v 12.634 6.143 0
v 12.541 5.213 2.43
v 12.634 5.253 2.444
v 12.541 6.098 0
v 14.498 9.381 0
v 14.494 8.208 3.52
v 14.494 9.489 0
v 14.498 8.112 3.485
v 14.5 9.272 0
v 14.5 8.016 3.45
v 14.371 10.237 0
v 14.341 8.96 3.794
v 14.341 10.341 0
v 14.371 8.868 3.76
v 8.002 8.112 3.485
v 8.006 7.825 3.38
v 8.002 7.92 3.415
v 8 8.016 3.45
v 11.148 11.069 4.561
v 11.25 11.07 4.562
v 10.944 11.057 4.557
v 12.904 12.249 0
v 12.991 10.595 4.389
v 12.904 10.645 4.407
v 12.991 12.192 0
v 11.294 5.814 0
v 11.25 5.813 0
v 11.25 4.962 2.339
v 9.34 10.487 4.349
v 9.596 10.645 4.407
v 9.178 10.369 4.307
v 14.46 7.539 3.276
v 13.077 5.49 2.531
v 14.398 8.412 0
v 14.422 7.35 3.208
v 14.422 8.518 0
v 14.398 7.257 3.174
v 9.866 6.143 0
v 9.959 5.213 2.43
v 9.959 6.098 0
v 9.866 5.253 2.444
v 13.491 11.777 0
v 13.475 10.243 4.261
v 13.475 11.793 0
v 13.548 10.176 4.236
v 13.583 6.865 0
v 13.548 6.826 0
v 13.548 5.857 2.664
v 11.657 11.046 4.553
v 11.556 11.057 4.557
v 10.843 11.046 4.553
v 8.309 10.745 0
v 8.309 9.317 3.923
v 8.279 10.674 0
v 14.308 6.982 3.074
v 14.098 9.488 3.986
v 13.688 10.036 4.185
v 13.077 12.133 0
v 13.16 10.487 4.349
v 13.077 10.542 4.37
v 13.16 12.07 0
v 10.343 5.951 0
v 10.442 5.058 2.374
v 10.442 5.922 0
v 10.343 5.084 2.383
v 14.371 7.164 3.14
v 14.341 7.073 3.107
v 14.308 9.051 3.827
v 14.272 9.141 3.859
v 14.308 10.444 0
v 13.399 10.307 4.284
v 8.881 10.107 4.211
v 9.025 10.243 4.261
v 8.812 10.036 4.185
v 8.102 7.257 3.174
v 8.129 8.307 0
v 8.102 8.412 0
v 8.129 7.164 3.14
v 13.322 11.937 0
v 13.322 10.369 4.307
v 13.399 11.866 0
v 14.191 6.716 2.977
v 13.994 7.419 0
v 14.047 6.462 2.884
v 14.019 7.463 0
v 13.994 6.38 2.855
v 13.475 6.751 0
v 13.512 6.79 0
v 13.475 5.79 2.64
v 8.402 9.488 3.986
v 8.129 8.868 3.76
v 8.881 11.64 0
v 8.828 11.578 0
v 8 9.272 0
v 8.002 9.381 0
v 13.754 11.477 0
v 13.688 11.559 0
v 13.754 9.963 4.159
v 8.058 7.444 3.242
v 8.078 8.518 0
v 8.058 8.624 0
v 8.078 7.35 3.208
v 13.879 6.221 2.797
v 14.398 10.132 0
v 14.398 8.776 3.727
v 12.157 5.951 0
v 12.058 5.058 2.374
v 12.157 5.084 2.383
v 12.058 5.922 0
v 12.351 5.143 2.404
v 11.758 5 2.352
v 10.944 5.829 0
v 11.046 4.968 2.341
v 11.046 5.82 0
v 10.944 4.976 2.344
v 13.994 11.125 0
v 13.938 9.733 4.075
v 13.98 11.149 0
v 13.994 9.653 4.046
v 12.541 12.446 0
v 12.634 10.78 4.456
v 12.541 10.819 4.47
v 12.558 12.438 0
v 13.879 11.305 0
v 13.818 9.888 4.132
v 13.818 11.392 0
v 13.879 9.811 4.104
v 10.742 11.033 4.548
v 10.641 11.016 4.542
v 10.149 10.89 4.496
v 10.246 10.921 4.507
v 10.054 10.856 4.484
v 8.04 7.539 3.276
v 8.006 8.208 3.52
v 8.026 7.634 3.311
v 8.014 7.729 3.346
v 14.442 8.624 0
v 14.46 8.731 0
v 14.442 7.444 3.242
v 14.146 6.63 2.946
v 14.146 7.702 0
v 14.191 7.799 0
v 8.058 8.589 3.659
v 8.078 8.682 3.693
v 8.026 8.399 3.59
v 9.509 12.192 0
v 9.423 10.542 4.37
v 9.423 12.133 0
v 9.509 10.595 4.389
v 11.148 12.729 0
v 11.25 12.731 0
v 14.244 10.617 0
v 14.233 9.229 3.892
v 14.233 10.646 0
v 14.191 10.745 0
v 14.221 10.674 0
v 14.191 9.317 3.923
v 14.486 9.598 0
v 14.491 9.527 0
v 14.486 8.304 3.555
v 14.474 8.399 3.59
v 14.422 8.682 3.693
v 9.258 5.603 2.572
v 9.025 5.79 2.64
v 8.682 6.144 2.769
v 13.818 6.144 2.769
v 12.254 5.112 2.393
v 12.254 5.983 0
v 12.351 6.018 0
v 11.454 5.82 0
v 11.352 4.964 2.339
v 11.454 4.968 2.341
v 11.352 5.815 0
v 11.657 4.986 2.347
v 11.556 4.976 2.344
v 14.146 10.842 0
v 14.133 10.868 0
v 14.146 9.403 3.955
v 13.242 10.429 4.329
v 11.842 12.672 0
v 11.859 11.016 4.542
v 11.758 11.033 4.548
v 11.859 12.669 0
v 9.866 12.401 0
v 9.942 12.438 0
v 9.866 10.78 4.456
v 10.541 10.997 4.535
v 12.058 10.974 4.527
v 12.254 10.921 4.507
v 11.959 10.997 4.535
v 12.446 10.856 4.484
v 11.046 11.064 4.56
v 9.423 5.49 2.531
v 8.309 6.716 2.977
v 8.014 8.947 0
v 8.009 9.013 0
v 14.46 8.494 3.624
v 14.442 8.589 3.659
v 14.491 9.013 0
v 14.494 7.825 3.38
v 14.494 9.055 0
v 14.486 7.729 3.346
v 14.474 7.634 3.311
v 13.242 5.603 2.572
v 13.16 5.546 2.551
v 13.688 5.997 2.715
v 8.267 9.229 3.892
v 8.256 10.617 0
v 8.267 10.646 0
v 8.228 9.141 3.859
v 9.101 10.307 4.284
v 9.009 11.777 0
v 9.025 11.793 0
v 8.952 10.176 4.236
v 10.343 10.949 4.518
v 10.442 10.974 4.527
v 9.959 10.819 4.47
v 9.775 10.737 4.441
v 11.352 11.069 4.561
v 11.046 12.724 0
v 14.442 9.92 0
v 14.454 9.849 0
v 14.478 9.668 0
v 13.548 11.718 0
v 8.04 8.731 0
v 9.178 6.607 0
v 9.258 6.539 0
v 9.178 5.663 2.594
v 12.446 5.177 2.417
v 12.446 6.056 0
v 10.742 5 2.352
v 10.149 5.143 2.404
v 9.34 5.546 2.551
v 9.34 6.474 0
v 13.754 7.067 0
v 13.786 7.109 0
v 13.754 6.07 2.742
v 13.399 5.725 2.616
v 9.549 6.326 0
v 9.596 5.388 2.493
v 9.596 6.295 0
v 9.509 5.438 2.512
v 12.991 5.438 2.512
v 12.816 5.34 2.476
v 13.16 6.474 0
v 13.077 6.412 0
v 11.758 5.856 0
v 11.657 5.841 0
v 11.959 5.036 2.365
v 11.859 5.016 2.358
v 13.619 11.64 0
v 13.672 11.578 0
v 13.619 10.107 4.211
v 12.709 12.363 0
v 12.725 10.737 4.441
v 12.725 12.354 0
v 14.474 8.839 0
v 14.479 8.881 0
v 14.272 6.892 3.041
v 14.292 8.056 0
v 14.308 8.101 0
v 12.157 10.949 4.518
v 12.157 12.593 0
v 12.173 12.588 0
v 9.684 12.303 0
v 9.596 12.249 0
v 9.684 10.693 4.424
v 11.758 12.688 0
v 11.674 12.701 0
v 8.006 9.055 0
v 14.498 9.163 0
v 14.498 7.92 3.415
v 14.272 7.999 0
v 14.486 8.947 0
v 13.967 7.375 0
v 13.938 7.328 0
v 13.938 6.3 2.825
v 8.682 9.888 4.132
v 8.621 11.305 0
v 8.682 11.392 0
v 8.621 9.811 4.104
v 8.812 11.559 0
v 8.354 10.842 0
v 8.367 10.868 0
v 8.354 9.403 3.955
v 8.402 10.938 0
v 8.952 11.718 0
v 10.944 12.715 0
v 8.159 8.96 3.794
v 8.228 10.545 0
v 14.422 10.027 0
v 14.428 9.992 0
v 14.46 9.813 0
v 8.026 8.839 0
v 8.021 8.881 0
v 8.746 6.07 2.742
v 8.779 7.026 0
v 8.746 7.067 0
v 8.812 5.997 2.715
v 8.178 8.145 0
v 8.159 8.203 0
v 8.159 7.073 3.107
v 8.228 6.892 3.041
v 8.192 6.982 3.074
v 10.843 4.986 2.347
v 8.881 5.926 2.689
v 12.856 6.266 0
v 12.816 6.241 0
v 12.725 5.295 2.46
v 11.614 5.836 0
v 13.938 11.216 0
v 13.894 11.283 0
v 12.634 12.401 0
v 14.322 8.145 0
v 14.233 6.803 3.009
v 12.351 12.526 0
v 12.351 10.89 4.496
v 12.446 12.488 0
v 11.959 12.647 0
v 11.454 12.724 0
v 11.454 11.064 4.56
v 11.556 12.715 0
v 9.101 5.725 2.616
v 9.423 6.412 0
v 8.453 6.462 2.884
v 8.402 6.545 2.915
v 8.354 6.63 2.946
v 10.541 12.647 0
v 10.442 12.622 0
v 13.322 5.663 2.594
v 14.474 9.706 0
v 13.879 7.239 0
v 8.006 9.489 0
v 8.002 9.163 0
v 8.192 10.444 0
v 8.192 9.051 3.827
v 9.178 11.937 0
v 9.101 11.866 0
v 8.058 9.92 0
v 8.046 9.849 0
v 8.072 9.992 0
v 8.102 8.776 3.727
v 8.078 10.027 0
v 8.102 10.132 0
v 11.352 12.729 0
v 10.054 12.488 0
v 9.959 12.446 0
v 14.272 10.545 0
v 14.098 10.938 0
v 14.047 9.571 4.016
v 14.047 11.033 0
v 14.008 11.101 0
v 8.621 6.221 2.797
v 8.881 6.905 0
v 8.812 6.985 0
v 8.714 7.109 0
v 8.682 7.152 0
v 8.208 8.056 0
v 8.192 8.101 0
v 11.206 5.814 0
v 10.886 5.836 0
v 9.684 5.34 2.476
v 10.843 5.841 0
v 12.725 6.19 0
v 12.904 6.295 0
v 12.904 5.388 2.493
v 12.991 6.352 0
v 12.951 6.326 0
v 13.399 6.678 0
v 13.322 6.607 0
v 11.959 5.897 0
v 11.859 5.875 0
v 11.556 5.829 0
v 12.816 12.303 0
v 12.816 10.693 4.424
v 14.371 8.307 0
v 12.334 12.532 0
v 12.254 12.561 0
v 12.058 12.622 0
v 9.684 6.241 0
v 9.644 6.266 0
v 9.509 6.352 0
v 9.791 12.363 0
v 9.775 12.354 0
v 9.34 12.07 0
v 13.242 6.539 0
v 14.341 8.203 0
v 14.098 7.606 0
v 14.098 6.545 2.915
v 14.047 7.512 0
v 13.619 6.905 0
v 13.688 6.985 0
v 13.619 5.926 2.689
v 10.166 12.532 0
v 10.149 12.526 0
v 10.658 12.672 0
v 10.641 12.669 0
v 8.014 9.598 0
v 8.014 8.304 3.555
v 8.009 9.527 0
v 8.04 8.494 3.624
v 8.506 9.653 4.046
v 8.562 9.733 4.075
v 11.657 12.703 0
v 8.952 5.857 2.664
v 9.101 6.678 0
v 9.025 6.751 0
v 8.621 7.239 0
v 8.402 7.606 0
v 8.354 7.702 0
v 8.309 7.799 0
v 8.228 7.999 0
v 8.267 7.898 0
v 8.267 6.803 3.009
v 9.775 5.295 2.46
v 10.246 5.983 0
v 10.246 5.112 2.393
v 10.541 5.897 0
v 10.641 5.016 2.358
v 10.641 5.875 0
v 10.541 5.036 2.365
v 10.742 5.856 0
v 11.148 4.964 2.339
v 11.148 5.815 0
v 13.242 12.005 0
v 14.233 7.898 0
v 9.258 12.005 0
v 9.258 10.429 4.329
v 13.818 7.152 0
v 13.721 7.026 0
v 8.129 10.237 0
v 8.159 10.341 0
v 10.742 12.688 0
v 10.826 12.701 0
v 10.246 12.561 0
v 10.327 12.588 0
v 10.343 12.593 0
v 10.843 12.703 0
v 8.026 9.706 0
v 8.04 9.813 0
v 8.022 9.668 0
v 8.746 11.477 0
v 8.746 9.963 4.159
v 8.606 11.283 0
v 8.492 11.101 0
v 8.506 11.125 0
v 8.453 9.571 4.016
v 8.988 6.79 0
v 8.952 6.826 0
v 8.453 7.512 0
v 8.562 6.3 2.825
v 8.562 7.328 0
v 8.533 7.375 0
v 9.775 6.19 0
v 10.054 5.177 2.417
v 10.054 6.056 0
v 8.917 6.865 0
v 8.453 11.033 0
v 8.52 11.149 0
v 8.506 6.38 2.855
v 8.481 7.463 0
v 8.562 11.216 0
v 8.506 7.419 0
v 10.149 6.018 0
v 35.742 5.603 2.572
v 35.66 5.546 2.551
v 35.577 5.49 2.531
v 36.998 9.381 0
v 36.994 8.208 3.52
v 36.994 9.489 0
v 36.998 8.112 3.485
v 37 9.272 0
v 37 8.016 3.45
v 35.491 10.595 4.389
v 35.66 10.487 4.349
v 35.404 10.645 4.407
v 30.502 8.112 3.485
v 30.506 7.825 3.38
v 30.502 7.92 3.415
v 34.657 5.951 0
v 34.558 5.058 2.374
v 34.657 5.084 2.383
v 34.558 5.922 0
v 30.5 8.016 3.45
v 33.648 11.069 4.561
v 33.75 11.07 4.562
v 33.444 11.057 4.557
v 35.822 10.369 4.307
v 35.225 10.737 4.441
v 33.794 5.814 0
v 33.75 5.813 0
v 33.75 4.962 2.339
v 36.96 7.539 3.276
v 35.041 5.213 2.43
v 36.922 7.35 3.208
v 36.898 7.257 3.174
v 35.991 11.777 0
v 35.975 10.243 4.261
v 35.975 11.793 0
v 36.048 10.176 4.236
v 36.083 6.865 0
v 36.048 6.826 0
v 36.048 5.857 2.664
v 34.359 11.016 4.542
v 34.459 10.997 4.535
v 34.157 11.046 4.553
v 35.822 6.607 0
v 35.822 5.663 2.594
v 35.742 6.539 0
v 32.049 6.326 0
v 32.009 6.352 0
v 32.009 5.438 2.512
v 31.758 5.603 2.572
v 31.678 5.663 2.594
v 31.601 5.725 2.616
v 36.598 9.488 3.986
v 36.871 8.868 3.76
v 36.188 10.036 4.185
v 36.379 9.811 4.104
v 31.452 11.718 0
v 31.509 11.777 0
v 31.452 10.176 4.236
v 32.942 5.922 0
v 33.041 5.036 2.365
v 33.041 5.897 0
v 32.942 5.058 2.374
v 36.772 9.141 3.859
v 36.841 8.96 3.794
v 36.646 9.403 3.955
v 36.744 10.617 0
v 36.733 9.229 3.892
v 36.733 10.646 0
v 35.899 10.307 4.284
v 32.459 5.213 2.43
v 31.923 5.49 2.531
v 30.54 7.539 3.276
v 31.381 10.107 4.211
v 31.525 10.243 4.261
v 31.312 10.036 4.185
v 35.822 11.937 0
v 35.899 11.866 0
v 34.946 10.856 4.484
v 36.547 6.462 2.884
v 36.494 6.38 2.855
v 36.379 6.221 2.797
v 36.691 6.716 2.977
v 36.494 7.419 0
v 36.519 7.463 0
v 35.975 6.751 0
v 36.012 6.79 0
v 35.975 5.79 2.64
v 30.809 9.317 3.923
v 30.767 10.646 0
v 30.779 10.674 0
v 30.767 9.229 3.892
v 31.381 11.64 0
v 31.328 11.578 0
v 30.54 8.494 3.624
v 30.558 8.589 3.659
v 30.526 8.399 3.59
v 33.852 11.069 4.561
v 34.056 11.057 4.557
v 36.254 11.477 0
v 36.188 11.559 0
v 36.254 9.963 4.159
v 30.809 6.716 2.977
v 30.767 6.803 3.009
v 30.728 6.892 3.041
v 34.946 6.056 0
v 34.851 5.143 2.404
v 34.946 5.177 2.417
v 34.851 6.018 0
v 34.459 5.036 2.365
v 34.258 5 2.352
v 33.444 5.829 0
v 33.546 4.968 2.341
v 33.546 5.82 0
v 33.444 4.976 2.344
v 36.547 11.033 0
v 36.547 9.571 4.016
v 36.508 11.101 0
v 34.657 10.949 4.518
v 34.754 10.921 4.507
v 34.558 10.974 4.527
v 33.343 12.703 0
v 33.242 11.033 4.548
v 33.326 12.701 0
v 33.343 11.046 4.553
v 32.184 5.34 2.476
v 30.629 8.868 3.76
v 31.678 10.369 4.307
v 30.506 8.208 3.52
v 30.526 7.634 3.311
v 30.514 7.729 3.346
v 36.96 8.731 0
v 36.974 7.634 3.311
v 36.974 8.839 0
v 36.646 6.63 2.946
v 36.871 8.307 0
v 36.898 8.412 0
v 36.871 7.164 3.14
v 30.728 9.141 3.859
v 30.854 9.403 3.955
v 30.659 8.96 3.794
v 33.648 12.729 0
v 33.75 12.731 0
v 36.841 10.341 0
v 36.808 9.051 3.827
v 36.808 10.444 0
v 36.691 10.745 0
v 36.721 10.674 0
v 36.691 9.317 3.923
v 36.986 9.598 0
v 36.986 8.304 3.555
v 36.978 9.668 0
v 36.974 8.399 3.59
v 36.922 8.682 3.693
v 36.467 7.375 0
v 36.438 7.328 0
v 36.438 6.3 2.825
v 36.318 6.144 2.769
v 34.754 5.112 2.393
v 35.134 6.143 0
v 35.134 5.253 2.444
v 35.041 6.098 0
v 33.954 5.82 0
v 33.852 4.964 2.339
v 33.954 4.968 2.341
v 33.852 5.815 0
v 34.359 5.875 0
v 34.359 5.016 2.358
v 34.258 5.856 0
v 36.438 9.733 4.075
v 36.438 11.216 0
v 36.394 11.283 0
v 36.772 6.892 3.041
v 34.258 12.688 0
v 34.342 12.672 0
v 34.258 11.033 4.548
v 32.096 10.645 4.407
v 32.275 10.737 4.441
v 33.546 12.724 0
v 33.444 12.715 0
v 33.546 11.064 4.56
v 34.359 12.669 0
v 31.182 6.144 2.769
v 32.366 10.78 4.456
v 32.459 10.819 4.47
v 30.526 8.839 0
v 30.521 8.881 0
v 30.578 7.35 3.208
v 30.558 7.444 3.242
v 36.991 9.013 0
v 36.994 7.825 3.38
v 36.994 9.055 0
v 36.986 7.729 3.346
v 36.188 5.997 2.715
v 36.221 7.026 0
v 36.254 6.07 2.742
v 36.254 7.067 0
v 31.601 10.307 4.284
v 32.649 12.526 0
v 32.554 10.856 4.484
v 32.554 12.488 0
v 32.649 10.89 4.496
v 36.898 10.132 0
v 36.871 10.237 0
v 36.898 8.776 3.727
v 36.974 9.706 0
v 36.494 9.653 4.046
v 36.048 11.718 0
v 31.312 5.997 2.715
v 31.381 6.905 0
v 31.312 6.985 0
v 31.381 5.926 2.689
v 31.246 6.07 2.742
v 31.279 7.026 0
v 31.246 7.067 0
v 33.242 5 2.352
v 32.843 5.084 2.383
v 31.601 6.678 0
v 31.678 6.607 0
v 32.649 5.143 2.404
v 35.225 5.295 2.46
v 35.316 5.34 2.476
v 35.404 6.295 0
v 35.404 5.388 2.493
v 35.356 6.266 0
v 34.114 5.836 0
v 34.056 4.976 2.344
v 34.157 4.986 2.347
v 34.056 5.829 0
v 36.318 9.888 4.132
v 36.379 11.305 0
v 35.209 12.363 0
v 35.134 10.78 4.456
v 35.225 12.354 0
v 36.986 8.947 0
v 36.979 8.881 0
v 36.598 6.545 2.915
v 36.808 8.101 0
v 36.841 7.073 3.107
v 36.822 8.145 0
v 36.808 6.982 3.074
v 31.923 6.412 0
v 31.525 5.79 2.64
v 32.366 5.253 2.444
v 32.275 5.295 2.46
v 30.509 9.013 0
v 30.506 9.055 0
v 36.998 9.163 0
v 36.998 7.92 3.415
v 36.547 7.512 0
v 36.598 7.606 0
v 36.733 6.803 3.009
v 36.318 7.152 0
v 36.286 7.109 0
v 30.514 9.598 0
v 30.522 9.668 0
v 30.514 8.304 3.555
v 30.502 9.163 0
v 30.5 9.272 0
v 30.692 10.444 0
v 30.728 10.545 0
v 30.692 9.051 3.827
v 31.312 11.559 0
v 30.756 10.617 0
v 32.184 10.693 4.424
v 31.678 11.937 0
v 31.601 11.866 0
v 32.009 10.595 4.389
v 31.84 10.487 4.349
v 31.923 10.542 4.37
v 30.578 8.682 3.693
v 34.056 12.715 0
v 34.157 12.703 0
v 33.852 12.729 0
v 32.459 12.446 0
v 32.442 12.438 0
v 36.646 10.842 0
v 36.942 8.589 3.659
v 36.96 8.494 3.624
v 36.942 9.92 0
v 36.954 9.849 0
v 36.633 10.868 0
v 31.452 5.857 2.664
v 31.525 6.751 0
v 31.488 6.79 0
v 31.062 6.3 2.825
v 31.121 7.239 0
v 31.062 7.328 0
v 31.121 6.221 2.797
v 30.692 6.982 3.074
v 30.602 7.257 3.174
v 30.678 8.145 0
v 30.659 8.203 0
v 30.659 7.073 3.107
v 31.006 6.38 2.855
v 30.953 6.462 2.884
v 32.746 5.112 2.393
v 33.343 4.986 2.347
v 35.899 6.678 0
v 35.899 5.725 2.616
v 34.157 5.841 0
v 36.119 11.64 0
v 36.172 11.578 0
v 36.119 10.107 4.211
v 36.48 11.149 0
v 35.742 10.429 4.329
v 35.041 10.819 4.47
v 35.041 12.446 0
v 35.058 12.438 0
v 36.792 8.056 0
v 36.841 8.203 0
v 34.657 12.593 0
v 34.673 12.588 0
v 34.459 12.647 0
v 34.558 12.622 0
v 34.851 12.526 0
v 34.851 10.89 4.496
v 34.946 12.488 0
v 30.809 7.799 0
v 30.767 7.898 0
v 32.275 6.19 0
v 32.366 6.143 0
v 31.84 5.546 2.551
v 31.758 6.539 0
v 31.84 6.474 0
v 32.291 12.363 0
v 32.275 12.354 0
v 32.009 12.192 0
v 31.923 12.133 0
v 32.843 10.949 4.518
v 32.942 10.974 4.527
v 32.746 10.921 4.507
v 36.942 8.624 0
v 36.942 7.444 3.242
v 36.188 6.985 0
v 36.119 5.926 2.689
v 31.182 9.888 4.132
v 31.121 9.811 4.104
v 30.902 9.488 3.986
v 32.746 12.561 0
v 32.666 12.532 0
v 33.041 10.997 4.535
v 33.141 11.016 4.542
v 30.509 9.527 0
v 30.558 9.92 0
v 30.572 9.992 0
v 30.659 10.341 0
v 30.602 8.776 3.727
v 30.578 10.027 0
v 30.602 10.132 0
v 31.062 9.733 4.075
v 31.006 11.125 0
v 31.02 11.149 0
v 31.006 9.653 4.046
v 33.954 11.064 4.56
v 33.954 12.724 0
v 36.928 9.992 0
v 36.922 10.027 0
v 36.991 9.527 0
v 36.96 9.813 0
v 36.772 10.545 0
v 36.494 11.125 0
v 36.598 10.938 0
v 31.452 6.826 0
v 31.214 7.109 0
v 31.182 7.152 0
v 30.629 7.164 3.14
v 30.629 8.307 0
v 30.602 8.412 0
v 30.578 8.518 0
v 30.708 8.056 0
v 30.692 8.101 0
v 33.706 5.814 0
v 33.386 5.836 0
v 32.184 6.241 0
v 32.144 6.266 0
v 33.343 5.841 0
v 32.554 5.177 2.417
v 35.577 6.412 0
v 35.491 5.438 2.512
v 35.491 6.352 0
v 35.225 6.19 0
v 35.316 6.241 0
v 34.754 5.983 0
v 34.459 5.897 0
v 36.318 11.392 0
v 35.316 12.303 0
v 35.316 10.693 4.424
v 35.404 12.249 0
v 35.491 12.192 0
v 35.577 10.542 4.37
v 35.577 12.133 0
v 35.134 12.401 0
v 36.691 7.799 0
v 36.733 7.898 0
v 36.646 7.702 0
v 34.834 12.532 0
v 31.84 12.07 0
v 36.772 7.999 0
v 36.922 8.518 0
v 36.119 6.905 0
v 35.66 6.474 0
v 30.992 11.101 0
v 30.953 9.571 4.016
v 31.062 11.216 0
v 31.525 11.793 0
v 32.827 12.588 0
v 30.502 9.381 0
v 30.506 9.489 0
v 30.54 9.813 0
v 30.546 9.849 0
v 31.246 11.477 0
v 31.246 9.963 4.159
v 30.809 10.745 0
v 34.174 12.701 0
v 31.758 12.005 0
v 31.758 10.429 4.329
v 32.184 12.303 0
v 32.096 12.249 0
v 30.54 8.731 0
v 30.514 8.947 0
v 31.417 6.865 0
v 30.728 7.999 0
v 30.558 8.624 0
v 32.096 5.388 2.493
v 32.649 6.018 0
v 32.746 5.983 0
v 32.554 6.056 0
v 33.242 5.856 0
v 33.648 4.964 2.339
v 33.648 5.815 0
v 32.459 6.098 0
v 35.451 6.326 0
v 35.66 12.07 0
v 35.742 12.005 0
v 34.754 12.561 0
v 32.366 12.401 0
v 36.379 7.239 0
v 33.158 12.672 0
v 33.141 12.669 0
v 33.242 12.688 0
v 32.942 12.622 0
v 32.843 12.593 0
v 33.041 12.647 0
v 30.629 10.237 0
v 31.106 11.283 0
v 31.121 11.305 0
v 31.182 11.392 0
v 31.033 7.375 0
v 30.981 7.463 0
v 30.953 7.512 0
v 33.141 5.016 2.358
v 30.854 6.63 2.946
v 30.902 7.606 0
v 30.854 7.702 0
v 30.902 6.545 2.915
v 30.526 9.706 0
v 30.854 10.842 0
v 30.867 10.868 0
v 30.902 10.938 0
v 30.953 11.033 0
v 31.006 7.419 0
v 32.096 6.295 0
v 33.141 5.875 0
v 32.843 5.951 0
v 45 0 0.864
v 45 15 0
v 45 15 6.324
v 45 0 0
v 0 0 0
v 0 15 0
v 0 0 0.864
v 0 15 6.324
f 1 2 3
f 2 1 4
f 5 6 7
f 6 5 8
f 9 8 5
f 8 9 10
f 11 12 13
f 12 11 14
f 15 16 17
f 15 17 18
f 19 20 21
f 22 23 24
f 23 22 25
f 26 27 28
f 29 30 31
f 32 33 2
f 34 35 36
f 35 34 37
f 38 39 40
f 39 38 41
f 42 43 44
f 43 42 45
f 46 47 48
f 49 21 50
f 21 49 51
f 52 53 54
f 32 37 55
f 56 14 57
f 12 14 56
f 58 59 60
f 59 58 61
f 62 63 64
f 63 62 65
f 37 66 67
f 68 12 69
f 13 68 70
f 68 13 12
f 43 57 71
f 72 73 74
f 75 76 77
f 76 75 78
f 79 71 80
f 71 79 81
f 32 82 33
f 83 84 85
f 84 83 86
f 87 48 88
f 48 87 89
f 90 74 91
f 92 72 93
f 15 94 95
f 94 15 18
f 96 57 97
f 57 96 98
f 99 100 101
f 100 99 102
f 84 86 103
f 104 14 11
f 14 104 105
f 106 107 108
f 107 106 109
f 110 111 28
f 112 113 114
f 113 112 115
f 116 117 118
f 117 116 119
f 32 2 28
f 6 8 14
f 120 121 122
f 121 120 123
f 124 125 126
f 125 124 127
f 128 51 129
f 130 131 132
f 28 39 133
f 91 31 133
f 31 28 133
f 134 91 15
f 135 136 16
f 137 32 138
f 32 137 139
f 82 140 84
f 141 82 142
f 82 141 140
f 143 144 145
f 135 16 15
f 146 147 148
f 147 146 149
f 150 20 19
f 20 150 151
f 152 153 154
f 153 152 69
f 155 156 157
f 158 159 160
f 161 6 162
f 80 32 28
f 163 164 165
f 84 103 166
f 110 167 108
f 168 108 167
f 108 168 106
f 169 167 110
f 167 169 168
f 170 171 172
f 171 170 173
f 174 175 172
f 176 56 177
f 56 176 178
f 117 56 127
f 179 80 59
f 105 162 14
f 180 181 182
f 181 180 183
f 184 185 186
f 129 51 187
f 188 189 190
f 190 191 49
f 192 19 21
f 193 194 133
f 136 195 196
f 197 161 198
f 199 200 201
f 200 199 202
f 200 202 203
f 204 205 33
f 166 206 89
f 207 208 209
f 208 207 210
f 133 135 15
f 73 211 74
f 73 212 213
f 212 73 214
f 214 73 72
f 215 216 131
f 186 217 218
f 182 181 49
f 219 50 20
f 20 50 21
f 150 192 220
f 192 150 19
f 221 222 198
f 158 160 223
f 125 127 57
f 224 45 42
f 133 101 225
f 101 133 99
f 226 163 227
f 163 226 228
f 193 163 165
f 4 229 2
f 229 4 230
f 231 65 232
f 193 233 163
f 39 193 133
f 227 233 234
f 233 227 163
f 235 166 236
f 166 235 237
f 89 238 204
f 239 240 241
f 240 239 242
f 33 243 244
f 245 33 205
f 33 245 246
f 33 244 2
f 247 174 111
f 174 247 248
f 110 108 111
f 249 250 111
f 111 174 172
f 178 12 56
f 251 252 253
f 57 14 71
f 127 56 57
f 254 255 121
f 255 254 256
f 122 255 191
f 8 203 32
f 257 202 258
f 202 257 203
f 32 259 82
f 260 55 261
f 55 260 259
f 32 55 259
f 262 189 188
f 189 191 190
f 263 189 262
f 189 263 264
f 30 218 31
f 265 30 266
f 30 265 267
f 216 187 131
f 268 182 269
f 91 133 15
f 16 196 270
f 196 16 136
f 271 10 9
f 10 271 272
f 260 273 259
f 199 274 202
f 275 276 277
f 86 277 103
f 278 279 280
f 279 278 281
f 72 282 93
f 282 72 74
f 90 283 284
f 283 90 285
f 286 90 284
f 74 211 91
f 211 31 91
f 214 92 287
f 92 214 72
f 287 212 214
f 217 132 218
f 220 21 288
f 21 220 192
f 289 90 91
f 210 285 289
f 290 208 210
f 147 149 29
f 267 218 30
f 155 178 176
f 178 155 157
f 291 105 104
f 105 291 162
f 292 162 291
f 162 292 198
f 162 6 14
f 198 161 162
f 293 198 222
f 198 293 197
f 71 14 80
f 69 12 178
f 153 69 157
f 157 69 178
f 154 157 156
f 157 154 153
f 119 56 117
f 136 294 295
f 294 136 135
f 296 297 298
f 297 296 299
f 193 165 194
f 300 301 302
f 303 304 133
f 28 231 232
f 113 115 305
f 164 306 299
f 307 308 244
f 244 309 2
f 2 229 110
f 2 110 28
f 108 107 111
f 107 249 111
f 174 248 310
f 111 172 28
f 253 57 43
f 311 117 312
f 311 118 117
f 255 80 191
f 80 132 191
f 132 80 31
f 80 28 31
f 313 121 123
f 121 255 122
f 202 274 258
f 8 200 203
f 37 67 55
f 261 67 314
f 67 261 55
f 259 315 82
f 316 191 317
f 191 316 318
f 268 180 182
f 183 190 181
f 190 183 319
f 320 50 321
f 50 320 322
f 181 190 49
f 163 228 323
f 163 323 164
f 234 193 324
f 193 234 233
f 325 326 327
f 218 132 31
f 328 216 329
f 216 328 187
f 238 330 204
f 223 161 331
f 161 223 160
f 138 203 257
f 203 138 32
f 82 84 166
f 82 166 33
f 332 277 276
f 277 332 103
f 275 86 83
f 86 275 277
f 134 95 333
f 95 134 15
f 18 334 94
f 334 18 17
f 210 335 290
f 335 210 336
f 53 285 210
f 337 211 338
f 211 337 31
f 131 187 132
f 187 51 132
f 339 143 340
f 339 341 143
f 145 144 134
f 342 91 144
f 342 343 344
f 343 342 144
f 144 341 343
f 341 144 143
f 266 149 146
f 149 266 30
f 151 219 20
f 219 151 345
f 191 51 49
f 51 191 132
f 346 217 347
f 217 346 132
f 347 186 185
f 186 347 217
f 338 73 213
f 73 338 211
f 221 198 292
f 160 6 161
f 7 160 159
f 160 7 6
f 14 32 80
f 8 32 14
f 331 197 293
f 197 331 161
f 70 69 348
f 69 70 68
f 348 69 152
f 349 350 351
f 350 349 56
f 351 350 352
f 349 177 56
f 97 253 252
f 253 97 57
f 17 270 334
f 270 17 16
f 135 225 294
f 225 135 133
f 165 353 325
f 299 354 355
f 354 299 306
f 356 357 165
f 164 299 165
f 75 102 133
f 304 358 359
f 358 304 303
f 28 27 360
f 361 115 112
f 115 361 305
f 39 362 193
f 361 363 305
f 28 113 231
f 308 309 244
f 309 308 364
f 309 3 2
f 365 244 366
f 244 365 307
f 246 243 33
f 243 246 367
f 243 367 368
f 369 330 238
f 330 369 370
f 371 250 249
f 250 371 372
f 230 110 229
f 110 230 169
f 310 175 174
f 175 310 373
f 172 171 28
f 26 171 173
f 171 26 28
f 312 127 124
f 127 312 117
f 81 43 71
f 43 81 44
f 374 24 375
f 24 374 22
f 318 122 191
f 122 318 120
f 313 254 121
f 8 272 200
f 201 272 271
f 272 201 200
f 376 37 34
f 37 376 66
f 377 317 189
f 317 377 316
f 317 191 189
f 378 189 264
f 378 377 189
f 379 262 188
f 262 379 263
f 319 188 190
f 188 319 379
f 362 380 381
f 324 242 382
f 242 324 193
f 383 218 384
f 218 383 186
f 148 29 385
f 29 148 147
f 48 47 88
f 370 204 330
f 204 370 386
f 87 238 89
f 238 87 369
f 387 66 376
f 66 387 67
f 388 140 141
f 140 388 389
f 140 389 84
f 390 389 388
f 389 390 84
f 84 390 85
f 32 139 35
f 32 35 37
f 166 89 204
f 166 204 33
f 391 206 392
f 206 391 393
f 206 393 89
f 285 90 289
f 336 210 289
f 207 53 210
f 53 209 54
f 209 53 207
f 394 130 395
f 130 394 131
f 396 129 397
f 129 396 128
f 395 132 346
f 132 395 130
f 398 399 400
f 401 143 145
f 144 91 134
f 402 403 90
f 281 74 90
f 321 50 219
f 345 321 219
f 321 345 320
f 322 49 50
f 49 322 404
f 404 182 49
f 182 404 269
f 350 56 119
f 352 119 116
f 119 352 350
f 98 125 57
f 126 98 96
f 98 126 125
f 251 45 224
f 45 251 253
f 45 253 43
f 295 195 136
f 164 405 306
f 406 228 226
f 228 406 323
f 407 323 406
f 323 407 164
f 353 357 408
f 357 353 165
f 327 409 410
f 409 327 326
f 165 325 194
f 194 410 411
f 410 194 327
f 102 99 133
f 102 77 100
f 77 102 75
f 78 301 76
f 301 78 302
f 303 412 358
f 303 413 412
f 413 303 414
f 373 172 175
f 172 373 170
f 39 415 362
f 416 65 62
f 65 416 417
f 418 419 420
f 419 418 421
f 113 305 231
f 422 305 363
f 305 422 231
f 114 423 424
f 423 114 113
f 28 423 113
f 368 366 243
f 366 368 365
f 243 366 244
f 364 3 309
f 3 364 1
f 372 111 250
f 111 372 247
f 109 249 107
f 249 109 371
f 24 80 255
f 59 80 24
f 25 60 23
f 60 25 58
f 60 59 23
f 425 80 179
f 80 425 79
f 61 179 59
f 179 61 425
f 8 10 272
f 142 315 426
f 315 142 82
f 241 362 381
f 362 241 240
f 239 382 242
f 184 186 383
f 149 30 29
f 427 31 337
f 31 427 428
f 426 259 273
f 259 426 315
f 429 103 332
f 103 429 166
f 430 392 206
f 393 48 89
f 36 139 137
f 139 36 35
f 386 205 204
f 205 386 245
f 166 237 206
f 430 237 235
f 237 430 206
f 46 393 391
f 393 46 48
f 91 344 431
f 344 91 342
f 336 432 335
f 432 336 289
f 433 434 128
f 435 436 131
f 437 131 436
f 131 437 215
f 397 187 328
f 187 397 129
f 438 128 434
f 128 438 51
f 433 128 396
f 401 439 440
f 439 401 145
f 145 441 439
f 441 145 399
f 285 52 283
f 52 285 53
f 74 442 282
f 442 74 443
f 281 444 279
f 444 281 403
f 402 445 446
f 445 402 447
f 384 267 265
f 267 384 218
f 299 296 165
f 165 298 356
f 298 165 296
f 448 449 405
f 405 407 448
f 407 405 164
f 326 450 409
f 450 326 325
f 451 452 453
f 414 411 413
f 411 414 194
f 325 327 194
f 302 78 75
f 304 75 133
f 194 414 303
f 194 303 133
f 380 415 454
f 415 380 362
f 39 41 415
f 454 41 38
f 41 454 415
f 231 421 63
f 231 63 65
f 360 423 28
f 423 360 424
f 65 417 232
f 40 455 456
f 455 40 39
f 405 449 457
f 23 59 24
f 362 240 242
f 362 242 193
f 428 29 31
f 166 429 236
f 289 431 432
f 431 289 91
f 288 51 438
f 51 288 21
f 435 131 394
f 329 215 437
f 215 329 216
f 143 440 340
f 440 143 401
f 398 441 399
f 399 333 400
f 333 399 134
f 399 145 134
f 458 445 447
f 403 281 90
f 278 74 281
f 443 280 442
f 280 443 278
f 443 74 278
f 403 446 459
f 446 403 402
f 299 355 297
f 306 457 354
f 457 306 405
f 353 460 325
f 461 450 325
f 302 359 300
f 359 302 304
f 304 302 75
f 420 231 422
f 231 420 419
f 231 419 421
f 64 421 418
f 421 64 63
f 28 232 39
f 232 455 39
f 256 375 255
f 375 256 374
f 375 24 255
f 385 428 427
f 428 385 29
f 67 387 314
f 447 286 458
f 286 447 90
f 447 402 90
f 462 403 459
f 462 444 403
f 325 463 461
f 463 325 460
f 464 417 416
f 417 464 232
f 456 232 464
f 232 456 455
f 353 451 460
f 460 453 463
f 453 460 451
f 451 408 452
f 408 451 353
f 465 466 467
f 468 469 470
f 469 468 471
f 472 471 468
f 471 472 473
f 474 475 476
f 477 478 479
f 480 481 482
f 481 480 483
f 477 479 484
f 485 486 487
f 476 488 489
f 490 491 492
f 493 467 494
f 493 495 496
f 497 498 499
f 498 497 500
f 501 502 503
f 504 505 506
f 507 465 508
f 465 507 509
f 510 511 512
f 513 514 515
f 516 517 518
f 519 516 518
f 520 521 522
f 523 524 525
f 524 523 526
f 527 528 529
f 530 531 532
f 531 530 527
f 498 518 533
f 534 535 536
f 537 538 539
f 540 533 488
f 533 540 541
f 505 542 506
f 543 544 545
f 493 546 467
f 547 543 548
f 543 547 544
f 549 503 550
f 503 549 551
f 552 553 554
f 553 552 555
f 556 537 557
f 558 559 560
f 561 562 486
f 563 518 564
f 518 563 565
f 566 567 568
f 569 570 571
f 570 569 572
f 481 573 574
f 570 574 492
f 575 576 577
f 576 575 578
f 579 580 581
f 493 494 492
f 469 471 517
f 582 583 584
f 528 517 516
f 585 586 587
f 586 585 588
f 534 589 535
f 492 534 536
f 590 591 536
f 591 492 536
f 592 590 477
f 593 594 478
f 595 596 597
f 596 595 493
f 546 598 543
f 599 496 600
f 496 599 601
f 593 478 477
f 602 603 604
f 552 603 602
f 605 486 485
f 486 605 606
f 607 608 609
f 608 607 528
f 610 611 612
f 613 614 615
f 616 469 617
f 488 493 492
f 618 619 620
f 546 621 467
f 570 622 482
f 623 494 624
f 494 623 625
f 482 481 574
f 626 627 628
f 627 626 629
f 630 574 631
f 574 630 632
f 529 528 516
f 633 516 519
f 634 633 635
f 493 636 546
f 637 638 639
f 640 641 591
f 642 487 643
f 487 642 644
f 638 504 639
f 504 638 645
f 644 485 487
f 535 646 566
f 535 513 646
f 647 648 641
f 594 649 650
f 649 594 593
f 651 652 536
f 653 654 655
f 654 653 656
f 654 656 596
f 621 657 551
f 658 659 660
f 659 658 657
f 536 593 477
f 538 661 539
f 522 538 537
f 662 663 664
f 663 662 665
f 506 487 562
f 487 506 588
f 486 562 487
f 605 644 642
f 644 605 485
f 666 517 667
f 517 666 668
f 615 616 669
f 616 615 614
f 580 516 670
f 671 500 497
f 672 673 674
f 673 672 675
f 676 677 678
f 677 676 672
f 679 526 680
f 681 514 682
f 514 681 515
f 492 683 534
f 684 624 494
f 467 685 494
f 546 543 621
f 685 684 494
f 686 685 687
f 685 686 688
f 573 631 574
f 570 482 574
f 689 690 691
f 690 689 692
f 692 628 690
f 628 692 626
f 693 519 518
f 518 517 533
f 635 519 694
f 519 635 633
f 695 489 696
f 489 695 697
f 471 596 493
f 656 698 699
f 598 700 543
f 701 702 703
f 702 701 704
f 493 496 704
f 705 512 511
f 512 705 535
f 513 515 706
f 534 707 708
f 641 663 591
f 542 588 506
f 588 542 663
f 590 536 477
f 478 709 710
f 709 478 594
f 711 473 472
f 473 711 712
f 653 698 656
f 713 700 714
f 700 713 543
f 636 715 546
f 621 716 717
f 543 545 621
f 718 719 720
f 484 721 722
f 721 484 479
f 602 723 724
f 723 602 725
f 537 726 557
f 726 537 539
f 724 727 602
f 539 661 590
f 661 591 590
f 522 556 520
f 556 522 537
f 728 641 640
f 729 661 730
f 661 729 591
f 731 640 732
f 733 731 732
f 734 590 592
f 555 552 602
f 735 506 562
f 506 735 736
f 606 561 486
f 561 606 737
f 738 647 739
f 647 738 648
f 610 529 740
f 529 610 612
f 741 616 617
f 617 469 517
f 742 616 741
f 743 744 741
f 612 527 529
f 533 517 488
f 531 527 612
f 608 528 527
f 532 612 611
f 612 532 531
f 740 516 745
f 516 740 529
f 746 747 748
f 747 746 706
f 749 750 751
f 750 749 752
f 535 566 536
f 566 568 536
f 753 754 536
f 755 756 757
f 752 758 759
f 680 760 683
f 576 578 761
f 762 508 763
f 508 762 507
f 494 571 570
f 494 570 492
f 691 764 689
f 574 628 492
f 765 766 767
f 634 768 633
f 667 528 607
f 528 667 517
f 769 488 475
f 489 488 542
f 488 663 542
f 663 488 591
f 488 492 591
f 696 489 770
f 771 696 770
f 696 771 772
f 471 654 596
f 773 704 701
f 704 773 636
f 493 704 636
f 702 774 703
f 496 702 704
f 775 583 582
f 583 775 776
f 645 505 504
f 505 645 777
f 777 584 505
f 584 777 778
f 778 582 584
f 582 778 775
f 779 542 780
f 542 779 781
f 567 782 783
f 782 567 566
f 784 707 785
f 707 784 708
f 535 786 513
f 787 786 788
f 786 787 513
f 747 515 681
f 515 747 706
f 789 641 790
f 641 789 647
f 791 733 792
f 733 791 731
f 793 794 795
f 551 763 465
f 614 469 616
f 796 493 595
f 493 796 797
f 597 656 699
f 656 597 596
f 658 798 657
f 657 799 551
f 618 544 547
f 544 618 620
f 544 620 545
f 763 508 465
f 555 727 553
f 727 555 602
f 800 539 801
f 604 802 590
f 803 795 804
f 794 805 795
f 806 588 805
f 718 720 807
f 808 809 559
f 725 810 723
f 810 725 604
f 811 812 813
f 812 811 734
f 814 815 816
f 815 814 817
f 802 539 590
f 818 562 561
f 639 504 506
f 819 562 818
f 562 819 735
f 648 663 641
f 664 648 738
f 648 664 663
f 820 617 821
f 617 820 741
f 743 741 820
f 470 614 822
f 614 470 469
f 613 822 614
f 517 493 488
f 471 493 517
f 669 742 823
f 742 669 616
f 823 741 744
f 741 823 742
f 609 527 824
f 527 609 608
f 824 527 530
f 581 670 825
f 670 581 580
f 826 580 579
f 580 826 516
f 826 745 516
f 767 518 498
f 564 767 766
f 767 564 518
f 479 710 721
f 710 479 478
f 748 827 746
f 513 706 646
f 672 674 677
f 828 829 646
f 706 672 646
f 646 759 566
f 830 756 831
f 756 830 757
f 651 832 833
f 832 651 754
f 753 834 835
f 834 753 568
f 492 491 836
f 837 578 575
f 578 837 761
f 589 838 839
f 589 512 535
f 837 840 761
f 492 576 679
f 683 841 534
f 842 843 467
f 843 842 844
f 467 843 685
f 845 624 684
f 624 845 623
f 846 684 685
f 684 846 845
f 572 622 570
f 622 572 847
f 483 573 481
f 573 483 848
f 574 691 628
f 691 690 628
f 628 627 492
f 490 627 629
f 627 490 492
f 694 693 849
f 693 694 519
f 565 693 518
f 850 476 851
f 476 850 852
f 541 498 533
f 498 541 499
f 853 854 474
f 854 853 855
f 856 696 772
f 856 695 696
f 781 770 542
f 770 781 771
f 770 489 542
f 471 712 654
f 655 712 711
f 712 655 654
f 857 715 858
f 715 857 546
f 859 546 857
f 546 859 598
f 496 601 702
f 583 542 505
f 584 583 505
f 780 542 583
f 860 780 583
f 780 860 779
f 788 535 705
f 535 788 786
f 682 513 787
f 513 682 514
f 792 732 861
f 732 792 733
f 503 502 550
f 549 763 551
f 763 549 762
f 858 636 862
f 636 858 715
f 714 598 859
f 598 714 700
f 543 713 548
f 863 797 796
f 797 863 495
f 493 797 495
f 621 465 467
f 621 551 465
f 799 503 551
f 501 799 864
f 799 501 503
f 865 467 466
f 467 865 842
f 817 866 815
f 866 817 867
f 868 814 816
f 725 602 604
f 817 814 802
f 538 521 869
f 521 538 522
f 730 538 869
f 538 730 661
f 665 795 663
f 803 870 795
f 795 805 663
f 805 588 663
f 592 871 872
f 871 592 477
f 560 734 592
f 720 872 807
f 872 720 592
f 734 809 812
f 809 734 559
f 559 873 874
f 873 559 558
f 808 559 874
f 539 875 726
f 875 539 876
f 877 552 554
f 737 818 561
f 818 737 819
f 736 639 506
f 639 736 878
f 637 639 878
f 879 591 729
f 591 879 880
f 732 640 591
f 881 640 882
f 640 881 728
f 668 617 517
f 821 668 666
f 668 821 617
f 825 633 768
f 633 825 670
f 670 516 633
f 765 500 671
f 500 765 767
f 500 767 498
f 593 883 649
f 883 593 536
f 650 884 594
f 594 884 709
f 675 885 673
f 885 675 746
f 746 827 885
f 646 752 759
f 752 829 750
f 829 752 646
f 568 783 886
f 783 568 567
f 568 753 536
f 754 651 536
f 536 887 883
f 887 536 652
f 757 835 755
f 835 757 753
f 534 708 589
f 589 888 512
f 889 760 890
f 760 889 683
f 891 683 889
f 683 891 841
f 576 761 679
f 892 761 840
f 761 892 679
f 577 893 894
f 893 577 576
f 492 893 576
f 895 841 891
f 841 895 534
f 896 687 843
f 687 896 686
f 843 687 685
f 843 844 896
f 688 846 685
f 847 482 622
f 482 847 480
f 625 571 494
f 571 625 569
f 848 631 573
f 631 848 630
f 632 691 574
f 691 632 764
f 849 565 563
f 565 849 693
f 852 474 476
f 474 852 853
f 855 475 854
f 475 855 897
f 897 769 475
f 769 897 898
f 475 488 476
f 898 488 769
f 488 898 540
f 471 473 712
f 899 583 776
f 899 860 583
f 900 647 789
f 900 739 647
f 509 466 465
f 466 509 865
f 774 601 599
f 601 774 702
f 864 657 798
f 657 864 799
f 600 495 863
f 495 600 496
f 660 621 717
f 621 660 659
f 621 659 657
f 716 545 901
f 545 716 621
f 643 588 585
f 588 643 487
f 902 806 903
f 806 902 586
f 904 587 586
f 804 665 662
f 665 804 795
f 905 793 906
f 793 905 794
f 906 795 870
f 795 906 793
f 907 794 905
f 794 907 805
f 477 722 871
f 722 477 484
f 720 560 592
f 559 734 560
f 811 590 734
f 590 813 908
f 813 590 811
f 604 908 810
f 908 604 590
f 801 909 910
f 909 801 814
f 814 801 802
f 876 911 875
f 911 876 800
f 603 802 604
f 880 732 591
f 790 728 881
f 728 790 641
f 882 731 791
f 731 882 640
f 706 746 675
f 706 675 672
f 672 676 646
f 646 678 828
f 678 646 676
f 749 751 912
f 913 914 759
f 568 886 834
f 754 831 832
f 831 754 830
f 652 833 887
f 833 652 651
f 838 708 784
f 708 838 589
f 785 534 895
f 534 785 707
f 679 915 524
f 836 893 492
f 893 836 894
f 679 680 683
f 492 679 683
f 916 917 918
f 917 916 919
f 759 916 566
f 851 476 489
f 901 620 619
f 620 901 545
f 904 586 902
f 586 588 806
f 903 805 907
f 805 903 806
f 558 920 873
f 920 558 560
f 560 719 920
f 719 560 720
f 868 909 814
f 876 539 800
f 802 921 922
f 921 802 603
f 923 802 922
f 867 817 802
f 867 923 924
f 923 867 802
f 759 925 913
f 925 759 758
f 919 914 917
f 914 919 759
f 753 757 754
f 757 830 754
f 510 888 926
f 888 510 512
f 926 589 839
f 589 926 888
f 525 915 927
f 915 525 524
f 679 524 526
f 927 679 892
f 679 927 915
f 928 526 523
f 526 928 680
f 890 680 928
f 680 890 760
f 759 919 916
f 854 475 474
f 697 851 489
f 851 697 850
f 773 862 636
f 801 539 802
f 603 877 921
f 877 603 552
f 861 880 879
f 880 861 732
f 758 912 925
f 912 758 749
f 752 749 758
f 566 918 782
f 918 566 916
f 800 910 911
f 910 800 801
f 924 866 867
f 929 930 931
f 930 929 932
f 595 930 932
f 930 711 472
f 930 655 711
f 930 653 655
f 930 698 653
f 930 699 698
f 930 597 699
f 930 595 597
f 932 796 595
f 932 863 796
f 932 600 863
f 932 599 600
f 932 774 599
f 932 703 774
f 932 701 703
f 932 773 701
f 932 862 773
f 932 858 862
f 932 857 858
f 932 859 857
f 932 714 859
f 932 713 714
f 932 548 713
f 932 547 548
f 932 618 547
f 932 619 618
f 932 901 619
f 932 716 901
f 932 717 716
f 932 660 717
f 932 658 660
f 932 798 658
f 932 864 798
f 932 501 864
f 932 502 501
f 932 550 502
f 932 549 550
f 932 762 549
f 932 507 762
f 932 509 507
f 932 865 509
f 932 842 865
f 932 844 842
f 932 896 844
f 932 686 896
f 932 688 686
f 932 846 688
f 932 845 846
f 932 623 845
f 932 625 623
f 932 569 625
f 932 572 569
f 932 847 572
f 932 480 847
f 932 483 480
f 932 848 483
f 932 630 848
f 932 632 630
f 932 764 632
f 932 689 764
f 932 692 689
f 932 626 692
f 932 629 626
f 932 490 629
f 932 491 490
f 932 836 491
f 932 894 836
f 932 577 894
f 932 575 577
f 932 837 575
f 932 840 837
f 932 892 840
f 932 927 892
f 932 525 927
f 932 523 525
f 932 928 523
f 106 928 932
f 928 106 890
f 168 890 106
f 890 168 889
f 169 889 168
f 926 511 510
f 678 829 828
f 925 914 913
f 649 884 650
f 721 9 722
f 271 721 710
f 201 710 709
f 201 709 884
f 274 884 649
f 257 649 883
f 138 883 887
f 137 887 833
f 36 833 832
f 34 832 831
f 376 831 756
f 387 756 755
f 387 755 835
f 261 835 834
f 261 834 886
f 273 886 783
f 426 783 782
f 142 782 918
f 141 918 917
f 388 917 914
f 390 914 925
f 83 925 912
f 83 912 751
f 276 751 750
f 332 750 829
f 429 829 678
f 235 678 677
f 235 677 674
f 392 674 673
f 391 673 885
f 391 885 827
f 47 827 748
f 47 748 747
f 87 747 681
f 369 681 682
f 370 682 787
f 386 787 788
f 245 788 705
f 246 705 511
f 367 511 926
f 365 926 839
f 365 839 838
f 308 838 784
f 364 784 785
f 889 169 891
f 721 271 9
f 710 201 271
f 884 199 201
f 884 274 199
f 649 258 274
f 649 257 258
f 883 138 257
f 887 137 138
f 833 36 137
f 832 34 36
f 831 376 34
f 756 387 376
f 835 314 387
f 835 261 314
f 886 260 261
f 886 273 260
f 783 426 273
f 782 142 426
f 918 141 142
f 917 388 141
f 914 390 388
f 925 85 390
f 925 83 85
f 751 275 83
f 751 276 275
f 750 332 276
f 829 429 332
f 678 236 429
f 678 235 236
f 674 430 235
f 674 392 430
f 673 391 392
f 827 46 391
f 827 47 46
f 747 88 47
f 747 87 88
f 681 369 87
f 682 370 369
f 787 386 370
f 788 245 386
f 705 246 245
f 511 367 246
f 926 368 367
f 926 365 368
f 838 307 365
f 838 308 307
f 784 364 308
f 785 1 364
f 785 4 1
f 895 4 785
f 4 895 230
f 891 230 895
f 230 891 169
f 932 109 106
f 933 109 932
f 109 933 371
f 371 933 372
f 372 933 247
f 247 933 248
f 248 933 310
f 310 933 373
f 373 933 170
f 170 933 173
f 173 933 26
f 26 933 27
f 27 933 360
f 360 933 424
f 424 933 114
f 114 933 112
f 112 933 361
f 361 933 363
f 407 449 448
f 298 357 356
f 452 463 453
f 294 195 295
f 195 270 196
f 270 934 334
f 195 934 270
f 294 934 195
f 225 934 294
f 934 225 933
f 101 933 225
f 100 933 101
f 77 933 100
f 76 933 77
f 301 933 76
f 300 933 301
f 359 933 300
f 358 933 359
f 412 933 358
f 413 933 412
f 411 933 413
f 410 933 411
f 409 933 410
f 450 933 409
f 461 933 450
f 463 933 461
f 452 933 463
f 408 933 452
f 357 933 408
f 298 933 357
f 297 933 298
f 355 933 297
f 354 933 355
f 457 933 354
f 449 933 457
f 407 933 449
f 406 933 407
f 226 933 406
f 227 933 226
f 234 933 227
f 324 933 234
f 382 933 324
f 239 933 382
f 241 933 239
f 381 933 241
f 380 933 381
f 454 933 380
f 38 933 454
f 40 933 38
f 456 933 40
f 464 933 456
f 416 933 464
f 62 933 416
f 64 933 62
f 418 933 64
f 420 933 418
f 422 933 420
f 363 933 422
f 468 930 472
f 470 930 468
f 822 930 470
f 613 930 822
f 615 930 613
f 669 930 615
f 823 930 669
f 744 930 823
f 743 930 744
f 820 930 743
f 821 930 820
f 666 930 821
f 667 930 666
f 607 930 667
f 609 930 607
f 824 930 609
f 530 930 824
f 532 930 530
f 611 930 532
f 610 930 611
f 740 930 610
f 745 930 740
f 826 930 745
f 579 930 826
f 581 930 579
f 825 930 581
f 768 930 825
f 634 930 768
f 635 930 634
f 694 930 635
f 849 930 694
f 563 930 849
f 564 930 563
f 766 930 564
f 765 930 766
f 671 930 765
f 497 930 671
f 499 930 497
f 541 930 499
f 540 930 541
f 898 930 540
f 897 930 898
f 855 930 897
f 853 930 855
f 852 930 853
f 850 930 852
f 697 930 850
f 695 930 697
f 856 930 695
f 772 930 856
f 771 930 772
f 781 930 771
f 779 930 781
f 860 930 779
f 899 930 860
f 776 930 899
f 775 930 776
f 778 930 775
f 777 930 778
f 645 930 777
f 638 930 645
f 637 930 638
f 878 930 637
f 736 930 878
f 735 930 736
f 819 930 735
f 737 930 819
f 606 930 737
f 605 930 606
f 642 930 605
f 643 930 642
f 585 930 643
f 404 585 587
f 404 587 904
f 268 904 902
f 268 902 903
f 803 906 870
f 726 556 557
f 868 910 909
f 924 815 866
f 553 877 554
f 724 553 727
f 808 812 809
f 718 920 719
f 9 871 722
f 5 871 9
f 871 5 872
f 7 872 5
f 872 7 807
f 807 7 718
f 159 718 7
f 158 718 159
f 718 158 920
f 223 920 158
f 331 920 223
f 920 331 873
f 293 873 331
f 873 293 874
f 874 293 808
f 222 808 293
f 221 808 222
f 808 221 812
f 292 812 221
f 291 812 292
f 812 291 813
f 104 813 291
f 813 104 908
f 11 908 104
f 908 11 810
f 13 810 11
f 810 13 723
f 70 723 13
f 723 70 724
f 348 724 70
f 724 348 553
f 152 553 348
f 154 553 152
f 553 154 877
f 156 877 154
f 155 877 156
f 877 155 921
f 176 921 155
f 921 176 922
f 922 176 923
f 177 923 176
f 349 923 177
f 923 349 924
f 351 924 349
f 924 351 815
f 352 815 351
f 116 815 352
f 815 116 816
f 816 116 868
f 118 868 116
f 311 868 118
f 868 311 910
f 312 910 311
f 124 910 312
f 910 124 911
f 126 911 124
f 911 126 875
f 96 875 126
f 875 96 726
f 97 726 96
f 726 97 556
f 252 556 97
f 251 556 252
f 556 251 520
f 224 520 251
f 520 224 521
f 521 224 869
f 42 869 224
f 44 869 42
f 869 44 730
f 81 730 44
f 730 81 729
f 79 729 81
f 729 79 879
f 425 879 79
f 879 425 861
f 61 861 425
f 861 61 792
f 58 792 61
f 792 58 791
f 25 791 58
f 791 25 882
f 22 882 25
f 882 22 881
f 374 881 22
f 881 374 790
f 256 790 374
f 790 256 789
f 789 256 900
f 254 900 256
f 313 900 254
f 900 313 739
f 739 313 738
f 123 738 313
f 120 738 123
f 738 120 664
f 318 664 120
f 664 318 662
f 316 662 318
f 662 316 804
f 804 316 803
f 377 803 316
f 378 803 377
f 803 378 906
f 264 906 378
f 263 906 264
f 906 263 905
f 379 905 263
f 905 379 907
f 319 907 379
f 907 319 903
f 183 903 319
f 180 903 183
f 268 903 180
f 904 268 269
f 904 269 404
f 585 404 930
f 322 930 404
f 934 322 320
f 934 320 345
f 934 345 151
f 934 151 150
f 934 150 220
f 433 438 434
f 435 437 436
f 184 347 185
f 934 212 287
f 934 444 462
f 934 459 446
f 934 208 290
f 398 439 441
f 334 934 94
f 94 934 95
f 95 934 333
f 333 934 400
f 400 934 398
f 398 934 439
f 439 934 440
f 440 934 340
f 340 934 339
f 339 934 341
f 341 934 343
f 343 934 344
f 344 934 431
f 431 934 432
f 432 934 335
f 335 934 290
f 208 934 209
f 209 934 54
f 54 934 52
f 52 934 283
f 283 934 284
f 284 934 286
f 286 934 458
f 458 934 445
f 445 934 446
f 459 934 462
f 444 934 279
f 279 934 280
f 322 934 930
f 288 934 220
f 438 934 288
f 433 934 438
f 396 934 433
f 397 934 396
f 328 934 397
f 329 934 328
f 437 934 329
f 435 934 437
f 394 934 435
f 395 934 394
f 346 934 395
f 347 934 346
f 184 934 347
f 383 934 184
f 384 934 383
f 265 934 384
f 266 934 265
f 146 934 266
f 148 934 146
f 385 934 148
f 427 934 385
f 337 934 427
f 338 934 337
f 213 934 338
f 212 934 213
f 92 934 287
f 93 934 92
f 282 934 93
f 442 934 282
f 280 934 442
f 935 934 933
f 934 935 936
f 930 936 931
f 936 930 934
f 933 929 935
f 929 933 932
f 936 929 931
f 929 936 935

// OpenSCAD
/**
 * Martin Egli
 * 2021-04-03
 */

res = 200;

module small_knife_holder(len = 45, angle = 20) {
    difference() {
        translate([0, 0, 0])
        cube([len, 15, 30]);
        translate([-5, -1, .5])
        rotate([angle, 0, 0])
        cube([len+10, 70, 30]);

        len1 = len/2;
        for (n = [0:1:1]) {
            translate([len1/2+n*len1, 10, -2])
            rotate([angle, 0, 0])
            cylinder(d = 6.5, h = 5.8, $fn = res);
        }
    }
}

module knife_holder(len = 50, angle = 20) {
    difference() {
        translate([0, 0, 0])
        cube([len, 30, 30]);
        translate([-5, -1, 3])
        rotate([angle, 0, 0])
        cube([len+10, 70, 30]);

        len1 = len/5;
        for (n = [0:1:4]) {
            translate([len1/2+n*len1, 15, -2])
            rotate([angle, 0, 0])
            cylinder(d = 6.5, h = 8.5, $fn = res);
        }
    }
}

small_knife_holder();
//knife_holder(100, 20);
//knife_holder(150, 20);
